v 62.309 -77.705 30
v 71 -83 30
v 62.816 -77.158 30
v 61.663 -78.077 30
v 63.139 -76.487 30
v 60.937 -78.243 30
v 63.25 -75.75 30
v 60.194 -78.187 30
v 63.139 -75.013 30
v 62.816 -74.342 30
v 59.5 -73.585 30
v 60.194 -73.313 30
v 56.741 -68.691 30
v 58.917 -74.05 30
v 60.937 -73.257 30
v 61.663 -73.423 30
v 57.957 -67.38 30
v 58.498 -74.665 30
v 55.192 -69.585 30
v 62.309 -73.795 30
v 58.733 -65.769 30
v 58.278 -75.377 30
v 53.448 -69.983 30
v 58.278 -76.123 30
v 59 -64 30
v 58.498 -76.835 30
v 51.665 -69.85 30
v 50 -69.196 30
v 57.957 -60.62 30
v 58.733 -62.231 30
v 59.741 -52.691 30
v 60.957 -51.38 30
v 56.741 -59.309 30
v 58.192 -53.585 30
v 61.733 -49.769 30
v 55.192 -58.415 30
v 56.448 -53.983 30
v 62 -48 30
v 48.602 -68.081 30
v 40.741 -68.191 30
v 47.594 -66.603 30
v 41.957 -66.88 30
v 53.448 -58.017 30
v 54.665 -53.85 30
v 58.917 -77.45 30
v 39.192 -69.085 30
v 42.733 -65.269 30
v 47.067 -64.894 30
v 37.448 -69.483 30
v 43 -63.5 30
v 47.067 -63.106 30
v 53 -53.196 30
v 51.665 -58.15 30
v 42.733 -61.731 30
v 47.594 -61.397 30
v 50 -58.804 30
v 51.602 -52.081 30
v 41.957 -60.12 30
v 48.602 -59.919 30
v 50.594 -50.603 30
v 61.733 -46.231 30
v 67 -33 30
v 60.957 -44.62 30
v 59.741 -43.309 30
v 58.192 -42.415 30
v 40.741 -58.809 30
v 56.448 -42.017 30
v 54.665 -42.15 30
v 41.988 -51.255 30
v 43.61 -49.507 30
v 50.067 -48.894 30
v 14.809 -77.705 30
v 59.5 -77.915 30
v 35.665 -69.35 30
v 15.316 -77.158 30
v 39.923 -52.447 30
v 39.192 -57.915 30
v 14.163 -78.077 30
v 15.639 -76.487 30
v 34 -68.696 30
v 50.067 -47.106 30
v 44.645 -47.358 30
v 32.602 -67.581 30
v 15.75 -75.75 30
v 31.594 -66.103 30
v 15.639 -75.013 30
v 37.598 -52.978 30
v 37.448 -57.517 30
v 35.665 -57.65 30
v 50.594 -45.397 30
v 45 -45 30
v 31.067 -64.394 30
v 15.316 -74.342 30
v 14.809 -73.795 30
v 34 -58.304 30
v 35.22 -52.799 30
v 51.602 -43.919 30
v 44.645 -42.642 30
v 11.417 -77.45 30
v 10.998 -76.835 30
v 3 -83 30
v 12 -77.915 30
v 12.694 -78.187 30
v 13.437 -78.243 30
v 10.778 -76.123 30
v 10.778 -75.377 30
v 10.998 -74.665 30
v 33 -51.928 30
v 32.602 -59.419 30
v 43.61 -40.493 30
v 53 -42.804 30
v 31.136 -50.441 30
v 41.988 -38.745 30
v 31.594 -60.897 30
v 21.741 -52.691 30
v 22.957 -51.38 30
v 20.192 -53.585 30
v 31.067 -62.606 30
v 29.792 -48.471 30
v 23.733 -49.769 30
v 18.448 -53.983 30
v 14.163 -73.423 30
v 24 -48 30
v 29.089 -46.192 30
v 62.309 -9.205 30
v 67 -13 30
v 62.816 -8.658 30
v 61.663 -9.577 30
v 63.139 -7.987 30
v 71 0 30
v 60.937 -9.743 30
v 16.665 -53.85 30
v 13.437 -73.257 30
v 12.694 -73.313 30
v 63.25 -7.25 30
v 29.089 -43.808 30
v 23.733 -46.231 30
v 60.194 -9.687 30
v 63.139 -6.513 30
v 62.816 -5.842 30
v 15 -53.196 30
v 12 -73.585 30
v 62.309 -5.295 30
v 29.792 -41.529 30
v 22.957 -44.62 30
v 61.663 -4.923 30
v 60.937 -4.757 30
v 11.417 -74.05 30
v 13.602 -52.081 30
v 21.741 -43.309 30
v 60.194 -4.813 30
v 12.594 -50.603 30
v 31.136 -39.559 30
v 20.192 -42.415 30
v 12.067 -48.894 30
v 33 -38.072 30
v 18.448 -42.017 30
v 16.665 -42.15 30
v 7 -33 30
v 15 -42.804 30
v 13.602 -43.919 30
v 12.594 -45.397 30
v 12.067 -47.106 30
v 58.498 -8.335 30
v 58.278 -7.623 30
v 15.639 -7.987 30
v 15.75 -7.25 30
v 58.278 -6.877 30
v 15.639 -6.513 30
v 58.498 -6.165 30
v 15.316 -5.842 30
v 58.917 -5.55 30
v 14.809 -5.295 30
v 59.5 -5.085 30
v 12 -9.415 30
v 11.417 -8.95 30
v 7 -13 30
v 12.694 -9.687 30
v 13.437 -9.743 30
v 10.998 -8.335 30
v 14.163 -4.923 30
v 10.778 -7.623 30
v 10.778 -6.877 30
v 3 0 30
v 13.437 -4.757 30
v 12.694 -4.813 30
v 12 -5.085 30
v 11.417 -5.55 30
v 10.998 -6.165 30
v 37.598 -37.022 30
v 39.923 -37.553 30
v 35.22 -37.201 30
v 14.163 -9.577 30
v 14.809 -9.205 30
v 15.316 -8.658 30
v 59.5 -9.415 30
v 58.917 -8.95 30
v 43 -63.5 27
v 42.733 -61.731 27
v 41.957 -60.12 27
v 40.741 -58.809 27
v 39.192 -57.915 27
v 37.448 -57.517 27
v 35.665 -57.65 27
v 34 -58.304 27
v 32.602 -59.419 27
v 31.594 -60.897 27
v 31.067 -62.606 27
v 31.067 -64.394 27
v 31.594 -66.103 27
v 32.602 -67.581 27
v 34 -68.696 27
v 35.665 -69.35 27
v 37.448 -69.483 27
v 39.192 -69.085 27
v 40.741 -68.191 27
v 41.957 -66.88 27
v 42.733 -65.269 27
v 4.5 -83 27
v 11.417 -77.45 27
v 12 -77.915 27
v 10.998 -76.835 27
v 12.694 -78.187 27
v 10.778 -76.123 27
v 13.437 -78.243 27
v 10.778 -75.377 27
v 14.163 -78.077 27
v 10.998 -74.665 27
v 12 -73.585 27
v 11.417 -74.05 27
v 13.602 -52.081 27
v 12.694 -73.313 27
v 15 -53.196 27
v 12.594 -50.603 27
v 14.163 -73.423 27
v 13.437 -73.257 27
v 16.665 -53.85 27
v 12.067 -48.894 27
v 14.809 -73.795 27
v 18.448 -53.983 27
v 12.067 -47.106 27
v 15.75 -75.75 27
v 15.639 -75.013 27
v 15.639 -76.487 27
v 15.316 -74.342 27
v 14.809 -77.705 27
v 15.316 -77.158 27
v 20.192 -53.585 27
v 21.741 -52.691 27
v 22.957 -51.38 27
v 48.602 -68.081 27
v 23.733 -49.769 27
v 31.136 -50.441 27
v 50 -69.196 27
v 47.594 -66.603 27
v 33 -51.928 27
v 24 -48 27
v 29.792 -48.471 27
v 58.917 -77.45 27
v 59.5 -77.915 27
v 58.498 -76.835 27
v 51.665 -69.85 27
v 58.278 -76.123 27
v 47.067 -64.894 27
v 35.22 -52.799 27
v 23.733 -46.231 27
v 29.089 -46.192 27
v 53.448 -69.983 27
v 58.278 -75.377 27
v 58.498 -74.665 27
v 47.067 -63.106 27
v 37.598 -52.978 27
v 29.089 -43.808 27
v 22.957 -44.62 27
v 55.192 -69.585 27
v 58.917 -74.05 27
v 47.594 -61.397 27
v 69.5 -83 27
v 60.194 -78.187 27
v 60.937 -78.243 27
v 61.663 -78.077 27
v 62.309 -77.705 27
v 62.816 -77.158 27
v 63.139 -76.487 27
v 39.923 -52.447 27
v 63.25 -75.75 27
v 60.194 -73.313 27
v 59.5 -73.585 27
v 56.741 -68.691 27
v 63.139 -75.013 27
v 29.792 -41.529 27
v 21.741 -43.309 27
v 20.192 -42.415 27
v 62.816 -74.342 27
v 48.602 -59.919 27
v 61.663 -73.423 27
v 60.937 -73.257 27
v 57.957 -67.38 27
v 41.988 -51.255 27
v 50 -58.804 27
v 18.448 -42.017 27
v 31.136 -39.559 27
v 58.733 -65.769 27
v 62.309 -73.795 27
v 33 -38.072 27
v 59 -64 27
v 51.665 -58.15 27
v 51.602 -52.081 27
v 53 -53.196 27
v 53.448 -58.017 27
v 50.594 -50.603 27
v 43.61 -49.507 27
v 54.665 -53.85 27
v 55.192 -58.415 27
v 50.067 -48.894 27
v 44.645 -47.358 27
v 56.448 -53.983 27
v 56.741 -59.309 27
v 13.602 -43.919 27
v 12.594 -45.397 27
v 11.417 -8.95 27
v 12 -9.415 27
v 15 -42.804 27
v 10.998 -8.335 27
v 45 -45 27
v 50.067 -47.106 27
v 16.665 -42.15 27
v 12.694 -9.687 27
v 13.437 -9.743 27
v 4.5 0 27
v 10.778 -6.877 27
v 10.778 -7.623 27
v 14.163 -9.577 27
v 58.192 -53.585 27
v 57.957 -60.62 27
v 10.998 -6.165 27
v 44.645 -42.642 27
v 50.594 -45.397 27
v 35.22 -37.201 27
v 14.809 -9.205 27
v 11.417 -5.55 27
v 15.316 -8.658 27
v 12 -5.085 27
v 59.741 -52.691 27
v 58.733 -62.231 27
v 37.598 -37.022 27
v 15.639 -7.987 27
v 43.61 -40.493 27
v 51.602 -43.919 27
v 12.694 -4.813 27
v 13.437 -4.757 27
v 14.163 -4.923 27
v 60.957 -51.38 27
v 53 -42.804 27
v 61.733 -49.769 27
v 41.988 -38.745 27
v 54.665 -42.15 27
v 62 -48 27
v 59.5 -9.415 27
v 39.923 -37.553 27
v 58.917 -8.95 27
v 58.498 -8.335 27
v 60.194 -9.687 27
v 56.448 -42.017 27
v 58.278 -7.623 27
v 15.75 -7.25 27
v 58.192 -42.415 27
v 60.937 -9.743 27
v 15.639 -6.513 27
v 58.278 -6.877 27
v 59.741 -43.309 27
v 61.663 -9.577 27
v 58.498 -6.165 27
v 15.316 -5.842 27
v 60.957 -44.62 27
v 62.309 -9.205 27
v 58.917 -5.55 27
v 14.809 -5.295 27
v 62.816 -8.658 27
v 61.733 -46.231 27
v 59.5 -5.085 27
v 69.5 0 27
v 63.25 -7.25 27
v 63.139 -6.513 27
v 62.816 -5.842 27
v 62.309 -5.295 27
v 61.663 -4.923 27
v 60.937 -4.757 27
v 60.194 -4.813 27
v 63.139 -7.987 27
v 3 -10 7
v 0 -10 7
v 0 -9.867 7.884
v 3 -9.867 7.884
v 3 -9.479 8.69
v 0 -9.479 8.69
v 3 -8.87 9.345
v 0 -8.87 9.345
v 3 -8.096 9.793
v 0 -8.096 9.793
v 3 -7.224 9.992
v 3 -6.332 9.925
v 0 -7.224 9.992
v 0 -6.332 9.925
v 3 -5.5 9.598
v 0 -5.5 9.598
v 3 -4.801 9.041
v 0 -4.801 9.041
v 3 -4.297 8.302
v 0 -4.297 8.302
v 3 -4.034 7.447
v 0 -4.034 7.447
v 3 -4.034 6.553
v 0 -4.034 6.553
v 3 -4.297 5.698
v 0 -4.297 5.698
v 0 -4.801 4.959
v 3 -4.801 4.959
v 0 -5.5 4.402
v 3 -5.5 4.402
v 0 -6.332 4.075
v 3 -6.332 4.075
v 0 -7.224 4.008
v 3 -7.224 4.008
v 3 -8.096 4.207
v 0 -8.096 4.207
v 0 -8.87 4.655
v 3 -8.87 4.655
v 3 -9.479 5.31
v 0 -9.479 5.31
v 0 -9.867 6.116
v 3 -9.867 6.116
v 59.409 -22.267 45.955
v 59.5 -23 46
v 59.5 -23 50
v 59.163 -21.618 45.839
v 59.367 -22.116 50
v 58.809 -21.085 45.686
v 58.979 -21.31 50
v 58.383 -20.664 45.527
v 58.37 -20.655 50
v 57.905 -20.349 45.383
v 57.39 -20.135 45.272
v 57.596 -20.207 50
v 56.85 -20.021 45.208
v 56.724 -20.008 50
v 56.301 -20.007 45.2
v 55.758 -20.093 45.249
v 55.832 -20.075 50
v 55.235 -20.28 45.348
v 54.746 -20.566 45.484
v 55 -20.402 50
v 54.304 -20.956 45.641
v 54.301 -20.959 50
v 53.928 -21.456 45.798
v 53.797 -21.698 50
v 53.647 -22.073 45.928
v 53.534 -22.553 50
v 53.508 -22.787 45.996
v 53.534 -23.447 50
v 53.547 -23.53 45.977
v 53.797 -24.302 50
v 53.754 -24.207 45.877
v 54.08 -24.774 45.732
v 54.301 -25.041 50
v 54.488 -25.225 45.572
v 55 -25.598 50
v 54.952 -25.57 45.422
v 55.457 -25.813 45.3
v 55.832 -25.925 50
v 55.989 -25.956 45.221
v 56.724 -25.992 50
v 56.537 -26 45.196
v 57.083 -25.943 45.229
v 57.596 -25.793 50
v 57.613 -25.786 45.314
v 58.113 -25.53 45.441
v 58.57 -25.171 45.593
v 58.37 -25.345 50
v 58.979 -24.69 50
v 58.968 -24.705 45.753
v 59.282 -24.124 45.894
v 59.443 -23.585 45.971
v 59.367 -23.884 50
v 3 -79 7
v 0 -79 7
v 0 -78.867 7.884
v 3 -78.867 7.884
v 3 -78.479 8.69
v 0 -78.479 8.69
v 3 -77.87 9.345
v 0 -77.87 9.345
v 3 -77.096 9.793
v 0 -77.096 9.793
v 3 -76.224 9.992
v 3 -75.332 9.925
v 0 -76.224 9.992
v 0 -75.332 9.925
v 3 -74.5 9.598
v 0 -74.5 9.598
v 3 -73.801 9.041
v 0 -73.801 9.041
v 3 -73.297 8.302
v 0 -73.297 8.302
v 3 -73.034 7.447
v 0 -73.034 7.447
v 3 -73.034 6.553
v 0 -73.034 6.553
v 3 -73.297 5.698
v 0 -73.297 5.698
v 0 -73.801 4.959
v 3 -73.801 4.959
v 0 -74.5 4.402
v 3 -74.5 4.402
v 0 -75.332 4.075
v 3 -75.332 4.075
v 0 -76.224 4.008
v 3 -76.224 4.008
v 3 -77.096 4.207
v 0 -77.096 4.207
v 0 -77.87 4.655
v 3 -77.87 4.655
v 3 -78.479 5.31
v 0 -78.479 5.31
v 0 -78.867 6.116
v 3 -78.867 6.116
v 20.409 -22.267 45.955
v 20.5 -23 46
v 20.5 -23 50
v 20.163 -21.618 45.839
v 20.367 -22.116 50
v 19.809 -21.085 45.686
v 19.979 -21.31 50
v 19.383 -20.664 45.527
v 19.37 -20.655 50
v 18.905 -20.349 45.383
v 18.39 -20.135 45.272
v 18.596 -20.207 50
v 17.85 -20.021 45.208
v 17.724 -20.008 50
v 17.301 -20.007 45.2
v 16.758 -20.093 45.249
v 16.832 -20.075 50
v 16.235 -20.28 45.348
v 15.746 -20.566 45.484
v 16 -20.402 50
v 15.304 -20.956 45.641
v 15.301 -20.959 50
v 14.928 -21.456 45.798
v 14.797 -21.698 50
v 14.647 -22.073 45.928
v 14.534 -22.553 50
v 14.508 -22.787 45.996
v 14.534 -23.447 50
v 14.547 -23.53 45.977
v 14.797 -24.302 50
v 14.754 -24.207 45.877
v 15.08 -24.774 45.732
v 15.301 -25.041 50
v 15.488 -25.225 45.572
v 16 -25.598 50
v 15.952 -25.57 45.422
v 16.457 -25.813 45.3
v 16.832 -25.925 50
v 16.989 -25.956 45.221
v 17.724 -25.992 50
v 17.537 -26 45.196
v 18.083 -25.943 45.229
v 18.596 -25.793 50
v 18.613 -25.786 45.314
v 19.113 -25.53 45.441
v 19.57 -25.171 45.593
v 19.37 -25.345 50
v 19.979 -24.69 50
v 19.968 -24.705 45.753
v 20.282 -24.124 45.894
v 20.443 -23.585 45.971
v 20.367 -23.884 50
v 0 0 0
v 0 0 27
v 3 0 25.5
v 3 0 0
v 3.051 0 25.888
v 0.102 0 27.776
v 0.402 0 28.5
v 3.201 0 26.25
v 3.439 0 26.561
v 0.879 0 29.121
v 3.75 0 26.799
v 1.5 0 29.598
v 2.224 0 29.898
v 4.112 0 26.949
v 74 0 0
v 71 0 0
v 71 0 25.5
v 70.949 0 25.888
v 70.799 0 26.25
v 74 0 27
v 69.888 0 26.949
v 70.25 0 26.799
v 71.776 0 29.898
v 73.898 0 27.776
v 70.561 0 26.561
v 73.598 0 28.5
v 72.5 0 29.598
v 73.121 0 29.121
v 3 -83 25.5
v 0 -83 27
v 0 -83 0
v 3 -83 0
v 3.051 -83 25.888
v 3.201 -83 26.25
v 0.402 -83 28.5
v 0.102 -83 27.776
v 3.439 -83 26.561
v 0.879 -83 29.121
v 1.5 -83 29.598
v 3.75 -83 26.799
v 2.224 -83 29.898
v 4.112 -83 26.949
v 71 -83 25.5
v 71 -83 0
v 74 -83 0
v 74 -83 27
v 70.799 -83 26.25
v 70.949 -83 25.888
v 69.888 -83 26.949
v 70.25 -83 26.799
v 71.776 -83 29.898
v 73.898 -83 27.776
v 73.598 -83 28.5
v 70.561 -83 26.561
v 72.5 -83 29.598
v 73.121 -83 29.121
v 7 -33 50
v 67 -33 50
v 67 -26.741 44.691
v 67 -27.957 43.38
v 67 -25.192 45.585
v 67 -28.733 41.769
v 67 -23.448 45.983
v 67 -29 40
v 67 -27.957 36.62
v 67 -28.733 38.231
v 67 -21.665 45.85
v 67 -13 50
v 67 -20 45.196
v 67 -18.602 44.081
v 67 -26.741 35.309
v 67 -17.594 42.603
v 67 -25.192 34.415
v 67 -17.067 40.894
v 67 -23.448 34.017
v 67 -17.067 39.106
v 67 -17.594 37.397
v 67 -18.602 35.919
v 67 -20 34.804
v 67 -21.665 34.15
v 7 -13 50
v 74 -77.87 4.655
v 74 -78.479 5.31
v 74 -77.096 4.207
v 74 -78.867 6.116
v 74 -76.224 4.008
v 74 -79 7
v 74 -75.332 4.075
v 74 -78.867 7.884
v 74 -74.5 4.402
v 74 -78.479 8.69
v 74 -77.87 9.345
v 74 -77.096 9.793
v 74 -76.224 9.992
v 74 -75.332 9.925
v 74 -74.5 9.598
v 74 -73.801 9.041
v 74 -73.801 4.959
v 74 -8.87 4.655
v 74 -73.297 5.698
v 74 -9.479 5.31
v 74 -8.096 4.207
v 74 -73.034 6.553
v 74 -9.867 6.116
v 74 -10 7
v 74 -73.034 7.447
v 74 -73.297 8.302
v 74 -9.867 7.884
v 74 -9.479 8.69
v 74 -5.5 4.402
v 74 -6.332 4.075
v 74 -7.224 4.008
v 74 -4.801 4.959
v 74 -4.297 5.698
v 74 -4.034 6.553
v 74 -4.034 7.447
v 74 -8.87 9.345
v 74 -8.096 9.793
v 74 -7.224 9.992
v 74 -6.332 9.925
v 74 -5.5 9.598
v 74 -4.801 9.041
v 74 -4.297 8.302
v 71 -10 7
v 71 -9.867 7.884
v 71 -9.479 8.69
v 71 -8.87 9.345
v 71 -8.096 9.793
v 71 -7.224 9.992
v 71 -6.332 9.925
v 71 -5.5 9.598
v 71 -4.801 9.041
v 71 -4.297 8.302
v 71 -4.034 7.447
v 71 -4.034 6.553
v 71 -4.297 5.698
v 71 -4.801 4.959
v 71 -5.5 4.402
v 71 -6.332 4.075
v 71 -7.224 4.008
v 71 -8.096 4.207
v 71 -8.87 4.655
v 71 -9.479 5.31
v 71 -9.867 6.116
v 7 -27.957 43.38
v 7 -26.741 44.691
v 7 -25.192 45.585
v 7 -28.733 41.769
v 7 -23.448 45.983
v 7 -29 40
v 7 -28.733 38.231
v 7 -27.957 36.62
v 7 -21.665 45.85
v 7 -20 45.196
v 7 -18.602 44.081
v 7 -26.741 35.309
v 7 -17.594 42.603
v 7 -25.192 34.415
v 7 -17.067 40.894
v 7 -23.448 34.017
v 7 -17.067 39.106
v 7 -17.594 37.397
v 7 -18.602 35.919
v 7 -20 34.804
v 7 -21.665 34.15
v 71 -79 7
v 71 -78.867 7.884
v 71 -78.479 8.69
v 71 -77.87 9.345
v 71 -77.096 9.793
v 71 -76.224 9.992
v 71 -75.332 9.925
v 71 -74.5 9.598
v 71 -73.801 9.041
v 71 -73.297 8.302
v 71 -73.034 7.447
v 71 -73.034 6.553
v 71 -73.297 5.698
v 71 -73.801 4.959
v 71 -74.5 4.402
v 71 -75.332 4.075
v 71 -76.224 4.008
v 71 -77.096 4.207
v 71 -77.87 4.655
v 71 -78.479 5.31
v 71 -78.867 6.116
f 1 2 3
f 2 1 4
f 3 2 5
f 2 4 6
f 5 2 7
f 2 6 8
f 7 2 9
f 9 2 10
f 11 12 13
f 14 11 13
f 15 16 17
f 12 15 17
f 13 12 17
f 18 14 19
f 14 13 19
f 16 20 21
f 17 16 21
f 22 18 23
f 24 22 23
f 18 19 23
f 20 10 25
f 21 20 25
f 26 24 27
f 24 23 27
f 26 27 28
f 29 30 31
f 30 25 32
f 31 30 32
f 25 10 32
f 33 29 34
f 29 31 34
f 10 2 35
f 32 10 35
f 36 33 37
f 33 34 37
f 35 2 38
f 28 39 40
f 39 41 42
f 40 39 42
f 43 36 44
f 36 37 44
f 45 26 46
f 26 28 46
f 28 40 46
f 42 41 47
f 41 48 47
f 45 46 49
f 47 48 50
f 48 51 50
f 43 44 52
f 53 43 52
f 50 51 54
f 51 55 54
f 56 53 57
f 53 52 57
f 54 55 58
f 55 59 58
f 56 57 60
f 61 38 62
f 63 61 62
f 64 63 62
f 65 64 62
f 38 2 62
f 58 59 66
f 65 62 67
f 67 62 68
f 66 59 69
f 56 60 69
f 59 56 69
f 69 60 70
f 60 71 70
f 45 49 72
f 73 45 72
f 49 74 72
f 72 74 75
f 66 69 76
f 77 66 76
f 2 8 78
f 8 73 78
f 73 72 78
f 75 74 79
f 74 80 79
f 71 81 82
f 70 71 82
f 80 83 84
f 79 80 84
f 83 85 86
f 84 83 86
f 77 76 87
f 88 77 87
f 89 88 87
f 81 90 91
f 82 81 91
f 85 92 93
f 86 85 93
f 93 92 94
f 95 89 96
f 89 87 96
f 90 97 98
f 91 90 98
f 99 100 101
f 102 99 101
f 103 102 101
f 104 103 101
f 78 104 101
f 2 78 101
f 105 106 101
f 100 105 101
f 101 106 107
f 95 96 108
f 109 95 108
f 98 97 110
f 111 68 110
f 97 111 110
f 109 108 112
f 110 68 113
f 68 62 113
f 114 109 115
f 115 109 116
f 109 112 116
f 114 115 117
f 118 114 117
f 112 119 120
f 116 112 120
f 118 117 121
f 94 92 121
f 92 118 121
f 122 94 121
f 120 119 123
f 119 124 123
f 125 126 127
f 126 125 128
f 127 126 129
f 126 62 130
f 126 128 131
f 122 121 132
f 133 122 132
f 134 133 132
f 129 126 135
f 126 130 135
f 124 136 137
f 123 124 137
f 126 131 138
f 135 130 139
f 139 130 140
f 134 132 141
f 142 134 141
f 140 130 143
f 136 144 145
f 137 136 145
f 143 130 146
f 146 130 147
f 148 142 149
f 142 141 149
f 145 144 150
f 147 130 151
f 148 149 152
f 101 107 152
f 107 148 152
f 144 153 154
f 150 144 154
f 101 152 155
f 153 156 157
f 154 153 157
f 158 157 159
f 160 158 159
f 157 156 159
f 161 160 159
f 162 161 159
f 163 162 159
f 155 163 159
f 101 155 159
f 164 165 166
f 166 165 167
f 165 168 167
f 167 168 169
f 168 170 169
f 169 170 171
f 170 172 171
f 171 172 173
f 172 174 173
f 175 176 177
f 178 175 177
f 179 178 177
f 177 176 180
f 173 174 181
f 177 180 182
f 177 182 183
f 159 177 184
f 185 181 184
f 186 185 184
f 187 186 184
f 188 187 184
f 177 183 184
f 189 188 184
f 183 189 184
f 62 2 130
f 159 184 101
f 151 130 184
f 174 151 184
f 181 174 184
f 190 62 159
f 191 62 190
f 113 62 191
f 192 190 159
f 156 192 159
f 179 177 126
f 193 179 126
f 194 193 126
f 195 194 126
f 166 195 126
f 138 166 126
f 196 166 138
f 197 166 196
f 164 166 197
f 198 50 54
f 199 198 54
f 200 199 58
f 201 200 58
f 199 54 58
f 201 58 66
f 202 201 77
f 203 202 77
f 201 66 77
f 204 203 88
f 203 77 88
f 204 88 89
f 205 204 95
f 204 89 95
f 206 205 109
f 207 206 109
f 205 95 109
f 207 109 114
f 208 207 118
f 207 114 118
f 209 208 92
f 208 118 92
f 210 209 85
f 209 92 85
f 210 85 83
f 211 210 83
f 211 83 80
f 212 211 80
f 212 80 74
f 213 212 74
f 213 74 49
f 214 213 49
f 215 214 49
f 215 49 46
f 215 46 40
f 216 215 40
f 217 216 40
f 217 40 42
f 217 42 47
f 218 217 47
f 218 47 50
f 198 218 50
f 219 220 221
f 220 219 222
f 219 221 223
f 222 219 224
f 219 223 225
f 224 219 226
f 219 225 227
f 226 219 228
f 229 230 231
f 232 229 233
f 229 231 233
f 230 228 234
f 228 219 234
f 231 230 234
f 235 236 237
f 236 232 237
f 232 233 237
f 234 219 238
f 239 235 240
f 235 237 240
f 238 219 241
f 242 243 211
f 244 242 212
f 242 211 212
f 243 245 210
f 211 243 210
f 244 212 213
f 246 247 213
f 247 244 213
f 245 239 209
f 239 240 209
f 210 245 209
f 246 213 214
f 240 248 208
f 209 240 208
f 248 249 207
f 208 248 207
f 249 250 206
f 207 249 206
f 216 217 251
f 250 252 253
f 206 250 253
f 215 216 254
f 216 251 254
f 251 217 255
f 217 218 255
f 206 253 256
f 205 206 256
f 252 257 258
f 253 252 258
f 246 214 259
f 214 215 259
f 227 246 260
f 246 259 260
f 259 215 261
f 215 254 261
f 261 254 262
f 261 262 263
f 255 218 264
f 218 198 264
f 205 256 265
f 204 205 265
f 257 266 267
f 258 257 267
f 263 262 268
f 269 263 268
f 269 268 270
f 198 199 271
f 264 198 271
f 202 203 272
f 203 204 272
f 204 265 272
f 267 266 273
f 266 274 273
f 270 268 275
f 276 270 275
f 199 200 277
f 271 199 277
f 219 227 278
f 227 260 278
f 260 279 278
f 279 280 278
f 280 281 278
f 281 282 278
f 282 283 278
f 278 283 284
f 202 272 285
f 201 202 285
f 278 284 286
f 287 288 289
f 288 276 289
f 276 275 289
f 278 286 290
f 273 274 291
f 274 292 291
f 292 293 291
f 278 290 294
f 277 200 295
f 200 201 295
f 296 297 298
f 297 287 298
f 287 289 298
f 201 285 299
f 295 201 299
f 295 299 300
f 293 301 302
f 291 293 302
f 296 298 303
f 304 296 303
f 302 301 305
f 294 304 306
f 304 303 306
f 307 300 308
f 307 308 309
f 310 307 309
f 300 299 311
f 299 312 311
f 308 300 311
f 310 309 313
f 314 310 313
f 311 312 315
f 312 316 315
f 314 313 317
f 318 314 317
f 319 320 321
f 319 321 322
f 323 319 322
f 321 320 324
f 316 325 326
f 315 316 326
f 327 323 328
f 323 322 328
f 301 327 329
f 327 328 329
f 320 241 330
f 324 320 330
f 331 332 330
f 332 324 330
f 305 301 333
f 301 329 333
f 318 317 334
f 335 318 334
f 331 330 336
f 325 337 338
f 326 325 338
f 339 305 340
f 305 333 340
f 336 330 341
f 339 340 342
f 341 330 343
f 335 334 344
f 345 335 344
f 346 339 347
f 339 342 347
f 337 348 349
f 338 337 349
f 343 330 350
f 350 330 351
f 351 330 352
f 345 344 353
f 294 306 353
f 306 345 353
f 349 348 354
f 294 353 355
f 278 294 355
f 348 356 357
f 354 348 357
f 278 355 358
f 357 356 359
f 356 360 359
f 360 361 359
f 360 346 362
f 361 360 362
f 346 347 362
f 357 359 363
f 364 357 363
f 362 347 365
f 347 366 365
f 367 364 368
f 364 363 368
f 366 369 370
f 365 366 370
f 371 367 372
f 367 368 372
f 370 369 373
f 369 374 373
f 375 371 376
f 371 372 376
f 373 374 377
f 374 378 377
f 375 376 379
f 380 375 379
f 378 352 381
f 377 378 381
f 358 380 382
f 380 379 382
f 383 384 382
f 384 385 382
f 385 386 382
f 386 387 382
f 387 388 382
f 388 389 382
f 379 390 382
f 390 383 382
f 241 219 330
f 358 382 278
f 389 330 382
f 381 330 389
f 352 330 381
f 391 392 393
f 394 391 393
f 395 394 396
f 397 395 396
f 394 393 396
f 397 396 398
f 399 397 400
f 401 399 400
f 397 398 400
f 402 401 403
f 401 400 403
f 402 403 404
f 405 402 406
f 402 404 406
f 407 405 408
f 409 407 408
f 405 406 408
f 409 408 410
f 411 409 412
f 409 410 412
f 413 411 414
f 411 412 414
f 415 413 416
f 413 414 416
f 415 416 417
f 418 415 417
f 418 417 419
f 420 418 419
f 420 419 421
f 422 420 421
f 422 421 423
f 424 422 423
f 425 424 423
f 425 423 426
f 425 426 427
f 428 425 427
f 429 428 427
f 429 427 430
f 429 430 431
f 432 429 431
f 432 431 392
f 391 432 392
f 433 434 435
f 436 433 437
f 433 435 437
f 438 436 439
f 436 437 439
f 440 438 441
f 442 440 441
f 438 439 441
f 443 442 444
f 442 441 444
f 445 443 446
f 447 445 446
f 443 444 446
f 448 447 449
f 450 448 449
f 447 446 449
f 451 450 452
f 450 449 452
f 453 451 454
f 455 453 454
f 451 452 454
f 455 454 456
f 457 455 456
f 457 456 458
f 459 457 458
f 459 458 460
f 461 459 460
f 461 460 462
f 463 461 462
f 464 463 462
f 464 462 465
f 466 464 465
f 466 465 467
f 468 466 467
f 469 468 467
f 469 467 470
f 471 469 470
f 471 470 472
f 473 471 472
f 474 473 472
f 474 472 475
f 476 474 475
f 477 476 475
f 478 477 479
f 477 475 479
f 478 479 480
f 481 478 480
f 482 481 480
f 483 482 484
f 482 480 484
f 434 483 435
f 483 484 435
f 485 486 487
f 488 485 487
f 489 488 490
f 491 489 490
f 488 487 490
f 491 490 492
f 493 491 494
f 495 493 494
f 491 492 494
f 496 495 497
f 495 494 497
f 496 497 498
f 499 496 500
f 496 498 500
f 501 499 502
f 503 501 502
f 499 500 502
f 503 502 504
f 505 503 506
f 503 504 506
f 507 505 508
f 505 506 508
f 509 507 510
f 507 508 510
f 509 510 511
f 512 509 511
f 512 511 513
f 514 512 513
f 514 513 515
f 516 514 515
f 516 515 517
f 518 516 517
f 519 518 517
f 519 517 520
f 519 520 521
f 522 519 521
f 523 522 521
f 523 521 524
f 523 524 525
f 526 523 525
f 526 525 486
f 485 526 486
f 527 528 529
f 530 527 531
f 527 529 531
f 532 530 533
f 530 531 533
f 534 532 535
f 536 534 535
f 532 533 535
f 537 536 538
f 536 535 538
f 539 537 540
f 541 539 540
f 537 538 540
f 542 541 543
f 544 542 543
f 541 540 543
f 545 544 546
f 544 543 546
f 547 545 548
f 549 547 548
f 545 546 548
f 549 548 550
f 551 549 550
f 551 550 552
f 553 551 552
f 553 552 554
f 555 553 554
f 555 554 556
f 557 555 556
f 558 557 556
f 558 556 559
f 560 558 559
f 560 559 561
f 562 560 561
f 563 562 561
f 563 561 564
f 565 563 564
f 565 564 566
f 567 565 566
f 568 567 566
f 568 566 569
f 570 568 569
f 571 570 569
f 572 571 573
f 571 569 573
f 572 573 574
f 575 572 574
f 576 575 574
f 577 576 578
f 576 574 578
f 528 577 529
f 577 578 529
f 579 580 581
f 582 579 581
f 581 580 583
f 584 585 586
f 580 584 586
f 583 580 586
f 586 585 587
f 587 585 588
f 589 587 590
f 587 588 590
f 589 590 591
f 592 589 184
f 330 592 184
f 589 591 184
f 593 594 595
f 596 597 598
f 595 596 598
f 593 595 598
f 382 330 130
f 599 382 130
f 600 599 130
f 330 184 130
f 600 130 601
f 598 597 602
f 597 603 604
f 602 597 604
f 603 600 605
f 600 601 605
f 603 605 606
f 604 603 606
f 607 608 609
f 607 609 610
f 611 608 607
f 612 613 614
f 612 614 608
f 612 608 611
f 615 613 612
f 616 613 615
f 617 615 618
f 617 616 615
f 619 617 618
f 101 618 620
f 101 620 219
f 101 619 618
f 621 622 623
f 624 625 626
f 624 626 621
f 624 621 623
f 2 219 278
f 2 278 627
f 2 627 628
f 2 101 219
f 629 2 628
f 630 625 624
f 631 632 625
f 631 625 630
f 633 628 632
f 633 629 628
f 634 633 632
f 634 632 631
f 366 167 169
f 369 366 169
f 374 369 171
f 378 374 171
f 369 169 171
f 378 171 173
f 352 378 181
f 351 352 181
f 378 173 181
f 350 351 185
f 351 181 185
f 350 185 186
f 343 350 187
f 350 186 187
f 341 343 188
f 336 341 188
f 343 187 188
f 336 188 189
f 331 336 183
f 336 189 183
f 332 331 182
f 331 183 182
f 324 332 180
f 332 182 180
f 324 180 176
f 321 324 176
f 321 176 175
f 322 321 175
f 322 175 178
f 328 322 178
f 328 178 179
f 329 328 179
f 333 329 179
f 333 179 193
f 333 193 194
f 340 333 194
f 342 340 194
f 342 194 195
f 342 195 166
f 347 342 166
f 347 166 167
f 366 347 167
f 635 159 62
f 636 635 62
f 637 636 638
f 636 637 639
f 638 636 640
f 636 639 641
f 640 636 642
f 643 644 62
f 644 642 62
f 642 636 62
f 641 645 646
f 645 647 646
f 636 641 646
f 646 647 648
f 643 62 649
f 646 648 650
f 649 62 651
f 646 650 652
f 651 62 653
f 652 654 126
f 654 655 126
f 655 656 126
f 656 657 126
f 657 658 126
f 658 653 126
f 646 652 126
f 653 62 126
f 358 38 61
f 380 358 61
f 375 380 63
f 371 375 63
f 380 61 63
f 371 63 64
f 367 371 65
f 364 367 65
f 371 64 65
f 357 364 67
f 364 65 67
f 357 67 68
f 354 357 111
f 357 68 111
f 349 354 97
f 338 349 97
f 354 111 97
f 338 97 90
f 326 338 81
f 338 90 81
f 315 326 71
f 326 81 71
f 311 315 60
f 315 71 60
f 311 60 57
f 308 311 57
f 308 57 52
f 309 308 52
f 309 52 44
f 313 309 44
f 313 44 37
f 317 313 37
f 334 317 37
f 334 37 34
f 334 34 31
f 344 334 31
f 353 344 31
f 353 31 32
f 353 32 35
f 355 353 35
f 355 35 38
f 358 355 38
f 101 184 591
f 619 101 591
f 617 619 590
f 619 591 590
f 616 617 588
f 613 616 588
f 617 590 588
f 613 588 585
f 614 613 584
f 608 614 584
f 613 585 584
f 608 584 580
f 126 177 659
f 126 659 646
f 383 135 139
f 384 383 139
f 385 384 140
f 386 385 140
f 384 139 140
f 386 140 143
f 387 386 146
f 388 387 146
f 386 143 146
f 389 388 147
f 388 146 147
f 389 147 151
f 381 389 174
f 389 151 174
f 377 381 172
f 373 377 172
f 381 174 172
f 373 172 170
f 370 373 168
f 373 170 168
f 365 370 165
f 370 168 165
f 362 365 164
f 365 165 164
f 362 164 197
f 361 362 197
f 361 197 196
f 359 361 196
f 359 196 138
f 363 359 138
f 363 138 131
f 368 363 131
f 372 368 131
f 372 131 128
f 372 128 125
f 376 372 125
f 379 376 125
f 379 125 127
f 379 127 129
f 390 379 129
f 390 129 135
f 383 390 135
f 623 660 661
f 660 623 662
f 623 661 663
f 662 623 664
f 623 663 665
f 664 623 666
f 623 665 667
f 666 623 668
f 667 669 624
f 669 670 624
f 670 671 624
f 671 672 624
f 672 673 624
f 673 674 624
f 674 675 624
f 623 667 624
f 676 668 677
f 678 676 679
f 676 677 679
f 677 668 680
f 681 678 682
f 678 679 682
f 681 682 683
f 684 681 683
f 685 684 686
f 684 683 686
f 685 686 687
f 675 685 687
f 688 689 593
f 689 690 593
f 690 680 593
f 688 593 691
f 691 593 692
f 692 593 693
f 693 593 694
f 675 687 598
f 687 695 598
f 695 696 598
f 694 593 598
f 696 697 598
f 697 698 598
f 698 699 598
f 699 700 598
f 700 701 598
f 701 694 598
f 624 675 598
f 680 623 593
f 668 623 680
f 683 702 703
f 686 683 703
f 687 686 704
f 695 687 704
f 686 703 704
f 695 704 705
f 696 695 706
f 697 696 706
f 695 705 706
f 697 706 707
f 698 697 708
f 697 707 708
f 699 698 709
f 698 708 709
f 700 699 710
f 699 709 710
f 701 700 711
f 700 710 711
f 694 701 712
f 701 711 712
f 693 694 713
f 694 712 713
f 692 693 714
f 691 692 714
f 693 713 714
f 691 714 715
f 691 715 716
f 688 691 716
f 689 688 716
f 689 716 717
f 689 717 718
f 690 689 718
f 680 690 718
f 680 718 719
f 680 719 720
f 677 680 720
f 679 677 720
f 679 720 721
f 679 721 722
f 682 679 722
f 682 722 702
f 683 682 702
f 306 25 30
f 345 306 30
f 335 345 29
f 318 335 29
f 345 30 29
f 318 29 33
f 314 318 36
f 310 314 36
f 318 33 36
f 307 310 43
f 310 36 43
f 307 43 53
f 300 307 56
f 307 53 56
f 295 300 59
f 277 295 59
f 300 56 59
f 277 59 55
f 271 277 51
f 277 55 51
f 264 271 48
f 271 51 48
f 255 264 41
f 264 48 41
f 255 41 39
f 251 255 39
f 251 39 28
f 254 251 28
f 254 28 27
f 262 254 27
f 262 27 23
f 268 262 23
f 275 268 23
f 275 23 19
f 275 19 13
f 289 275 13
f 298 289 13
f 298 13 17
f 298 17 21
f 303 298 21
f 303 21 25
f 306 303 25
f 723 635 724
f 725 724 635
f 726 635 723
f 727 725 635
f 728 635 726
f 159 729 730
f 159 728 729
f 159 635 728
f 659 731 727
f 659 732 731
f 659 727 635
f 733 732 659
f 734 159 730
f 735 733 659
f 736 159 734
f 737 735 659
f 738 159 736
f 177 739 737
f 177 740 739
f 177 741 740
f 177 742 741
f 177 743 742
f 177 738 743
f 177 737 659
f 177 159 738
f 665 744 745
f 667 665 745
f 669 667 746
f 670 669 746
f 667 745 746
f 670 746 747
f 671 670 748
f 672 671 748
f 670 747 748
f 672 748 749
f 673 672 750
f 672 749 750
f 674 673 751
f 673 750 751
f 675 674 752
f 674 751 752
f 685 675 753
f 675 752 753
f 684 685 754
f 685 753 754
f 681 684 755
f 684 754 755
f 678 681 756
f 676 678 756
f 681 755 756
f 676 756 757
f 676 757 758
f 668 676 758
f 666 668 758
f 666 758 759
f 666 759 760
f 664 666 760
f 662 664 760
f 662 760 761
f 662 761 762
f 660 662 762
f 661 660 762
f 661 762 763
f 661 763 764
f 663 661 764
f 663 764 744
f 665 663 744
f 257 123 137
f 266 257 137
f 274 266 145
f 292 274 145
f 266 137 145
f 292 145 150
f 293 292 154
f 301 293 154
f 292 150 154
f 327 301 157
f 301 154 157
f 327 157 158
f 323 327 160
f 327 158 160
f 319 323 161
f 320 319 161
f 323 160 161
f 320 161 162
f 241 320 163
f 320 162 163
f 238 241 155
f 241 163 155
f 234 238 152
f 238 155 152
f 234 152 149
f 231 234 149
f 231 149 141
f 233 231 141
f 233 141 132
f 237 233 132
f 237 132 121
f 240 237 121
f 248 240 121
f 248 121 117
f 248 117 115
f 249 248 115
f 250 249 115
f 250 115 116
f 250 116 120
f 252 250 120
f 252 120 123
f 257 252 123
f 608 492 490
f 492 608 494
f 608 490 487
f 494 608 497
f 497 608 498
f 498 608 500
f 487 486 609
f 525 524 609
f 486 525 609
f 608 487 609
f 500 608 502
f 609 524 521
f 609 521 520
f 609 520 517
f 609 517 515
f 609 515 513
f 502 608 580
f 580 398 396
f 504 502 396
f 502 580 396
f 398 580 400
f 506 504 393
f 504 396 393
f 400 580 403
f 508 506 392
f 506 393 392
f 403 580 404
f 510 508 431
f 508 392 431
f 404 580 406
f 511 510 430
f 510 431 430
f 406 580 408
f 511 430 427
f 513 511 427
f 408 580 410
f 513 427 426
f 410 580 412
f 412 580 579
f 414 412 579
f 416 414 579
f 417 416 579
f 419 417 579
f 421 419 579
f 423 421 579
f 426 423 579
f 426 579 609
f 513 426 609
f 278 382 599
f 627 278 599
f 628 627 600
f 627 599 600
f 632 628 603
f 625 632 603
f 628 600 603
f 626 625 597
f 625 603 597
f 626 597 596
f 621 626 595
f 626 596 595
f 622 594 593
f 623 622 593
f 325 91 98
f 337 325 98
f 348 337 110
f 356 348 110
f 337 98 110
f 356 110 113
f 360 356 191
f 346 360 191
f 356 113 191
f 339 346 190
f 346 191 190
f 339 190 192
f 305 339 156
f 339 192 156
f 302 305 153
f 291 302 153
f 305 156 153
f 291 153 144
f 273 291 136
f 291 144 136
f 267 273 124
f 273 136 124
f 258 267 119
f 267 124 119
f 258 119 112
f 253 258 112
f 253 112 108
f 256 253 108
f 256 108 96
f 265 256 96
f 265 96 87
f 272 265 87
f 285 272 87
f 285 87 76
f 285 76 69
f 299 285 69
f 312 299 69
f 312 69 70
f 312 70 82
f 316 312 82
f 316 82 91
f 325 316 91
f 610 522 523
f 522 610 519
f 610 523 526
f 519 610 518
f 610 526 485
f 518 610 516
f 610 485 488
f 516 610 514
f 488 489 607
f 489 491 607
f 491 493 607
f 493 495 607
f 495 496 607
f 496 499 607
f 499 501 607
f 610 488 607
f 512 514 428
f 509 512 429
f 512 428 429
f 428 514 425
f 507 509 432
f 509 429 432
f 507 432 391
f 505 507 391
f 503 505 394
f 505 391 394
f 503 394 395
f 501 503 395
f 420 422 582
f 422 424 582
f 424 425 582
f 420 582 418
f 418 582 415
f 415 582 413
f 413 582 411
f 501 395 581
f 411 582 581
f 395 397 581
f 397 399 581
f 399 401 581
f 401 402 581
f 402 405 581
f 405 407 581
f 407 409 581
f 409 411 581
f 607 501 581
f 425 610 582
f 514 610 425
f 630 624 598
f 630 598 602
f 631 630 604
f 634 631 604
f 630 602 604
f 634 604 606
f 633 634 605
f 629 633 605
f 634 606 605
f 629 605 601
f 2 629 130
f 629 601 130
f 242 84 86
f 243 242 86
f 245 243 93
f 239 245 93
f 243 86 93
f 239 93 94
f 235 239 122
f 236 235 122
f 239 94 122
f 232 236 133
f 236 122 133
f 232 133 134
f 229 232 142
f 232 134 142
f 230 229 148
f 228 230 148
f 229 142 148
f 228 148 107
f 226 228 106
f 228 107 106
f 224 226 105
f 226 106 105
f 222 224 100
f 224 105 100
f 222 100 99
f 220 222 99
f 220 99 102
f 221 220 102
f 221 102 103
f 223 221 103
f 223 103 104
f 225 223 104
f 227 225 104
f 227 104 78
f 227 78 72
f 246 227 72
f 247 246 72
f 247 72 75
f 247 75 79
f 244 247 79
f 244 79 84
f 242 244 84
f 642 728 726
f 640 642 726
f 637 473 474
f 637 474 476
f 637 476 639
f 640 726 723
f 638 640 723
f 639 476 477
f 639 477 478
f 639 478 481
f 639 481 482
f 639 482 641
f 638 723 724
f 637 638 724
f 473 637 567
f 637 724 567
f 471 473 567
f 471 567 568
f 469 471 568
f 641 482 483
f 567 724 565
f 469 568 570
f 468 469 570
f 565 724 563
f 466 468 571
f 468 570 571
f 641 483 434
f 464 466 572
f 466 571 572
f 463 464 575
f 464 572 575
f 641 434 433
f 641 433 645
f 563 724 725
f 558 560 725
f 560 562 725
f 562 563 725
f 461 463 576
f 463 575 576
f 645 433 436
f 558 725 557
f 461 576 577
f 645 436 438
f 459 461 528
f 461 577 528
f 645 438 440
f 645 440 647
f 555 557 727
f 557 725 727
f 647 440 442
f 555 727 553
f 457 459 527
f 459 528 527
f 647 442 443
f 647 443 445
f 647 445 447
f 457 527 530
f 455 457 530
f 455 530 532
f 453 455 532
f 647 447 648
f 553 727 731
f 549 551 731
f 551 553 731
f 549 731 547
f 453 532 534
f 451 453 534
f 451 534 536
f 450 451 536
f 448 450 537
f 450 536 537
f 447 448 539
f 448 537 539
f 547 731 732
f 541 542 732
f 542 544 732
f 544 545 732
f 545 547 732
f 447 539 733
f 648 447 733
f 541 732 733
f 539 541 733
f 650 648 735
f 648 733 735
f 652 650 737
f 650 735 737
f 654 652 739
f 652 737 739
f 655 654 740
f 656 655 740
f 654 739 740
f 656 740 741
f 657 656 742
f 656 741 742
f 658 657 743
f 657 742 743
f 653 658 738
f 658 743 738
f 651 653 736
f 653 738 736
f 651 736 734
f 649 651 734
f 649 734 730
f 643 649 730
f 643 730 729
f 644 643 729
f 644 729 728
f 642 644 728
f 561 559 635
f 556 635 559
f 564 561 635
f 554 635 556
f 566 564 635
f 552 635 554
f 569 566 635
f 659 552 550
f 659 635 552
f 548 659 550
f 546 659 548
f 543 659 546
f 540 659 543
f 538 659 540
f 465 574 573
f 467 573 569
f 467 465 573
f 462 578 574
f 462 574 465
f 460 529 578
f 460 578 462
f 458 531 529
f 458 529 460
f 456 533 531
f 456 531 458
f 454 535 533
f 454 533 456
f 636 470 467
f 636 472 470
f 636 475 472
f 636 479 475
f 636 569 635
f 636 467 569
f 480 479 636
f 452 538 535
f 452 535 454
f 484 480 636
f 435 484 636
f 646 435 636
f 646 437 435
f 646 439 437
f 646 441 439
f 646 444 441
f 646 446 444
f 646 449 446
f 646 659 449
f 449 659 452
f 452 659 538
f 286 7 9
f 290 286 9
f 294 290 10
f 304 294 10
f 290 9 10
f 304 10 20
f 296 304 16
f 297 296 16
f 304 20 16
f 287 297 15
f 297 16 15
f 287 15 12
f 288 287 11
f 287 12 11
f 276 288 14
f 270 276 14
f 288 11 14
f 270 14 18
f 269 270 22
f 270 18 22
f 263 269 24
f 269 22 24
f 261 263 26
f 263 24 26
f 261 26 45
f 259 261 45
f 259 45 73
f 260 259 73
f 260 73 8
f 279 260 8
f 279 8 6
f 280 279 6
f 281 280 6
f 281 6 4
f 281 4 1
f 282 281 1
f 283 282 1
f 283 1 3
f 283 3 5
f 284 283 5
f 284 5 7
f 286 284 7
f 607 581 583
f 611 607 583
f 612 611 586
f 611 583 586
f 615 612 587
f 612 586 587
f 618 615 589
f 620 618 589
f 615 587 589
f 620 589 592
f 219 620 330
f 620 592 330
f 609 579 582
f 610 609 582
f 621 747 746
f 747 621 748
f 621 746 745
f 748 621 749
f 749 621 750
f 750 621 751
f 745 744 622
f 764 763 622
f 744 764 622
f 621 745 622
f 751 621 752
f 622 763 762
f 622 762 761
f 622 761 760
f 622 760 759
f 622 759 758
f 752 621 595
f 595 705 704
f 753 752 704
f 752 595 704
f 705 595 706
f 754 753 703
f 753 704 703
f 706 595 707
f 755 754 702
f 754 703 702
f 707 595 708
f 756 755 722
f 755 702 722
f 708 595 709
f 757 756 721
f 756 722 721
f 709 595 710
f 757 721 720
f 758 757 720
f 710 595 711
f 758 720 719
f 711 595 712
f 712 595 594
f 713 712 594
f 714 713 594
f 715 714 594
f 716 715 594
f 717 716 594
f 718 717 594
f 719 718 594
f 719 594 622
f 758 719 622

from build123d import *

# Parameters (mm, degrees)
F1_DEPTH  = 83
F2_R      = 2.5
F3_DEPTH  = 30.001
F4_R      = 8
F4_R_2    = 6
F5_DEPTH  = 30.001
F6_R      = 3
F7_DEPTH  = 74.001
F8_W      = 60
F8_H      = 20
F9_DEPTH  = 20
F10_R     = 6
F11_DEPTH = 67.001
F12_R     = 3
F13_DEPTH = 4.8048476773


with BuildPart() as f1:
    # F0 (on Front) → F1 (new body)
    with BuildSketch(Plane.XZ):
        with BuildLine():
            Line((0, 27), (0, 0))
            Line((0, 0), (3, 0))
            Line((3, 0), (3, 25.5))
            ThreePointArc((3, 25.5), (3.4393398282, 26.5606601718), (4.5, 27))
            Line((4.5, 27), (69.5, 27))
            ThreePointArc((69.5, 27), (70.5606601718, 26.5606601718), (71, 25.5))
            Line((71, 25.5), (71, 0))
            Line((71, 0), (74, 0))
            Line((74, 0), (74, 27))
            ThreePointArc((74, 27), (73.1213203436, 29.1213203436), (71, 30))
            Line((71, 30), (3, 30))
            ThreePointArc((3, 30), (0.8786796564, 29.1213203436), (0, 27))
        make_face()
    extrude(amount=F1_DEPTH)

    # F2 (on face) → F3 (cut, through all)
    with BuildSketch(Plane.XY.offset(30)):
        with Locations((13.25, -7.25)):
            Circle(F2_R)
        with Locations((60.75, -7.25)):
            Circle(F2_R)
        with Locations((60.75, -75.75)):
            Circle(F2_R)
        with Locations((13.25, -75.75)):
            Circle(F2_R)
    extrude(amount=-F3_DEPTH, mode=Mode.SUBTRACT)

    # F4 (on face) → F5 (cut, through all)
    with BuildSketch(Plane.XY.offset(30)):
        with Locations((37, -45)):
            Circle(F4_R)
        with Locations((56, -48)):
            Circle(F4_R_2)
        with Locations((53, -64)):
            Circle(F4_R_2)
        with Locations((37, -63.5)):
            Circle(F4_R_2)
        with Locations((18, -48)):
            Circle(F4_R_2)
    extrude(amount=-F5_DEPTH, mode=Mode.SUBTRACT)

    # F6 (on face) → F7 (cut, through all)
    with BuildSketch(Plane(origin=(0, 0, 0), x_dir=(0, -1, 0), z_dir=(-1, 0, 0))):
        with Locations((7, 7)):
            Circle(F6_R)
        with Locations((76, 7)):
            Circle(F6_R)
    extrude(amount=-F7_DEPTH, mode=Mode.SUBTRACT)

    # F8 (on face) → F9 (join)
    with BuildSketch(Plane.XY.offset(30)):
        with Locations((37, -23)):
            Rectangle(F8_W, F8_H)
    extrude(amount=F9_DEPTH)

    # F10 (on face) → F11 (cut, through all)
    with BuildSketch(Plane(origin=(7, 0, 0), x_dir=(0, -1, 0), z_dir=(-1, 0, 0))):
        with Locations((23, 40)):
            Circle(F10_R)
    extrude(amount=-F11_DEPTH, mode=Mode.SUBTRACT)

    # F12 (on face) → F13 (cut, through all)
    with BuildSketch(Plane.XY.offset(50)):
        with Locations((17.5, -23)):
            Circle(F12_R)
        with Locations((56.5, -23)):
            Circle(F12_R)
    extrude(amount=-F13_DEPTH, mode=Mode.SUBTRACT)


solid = f1.part
